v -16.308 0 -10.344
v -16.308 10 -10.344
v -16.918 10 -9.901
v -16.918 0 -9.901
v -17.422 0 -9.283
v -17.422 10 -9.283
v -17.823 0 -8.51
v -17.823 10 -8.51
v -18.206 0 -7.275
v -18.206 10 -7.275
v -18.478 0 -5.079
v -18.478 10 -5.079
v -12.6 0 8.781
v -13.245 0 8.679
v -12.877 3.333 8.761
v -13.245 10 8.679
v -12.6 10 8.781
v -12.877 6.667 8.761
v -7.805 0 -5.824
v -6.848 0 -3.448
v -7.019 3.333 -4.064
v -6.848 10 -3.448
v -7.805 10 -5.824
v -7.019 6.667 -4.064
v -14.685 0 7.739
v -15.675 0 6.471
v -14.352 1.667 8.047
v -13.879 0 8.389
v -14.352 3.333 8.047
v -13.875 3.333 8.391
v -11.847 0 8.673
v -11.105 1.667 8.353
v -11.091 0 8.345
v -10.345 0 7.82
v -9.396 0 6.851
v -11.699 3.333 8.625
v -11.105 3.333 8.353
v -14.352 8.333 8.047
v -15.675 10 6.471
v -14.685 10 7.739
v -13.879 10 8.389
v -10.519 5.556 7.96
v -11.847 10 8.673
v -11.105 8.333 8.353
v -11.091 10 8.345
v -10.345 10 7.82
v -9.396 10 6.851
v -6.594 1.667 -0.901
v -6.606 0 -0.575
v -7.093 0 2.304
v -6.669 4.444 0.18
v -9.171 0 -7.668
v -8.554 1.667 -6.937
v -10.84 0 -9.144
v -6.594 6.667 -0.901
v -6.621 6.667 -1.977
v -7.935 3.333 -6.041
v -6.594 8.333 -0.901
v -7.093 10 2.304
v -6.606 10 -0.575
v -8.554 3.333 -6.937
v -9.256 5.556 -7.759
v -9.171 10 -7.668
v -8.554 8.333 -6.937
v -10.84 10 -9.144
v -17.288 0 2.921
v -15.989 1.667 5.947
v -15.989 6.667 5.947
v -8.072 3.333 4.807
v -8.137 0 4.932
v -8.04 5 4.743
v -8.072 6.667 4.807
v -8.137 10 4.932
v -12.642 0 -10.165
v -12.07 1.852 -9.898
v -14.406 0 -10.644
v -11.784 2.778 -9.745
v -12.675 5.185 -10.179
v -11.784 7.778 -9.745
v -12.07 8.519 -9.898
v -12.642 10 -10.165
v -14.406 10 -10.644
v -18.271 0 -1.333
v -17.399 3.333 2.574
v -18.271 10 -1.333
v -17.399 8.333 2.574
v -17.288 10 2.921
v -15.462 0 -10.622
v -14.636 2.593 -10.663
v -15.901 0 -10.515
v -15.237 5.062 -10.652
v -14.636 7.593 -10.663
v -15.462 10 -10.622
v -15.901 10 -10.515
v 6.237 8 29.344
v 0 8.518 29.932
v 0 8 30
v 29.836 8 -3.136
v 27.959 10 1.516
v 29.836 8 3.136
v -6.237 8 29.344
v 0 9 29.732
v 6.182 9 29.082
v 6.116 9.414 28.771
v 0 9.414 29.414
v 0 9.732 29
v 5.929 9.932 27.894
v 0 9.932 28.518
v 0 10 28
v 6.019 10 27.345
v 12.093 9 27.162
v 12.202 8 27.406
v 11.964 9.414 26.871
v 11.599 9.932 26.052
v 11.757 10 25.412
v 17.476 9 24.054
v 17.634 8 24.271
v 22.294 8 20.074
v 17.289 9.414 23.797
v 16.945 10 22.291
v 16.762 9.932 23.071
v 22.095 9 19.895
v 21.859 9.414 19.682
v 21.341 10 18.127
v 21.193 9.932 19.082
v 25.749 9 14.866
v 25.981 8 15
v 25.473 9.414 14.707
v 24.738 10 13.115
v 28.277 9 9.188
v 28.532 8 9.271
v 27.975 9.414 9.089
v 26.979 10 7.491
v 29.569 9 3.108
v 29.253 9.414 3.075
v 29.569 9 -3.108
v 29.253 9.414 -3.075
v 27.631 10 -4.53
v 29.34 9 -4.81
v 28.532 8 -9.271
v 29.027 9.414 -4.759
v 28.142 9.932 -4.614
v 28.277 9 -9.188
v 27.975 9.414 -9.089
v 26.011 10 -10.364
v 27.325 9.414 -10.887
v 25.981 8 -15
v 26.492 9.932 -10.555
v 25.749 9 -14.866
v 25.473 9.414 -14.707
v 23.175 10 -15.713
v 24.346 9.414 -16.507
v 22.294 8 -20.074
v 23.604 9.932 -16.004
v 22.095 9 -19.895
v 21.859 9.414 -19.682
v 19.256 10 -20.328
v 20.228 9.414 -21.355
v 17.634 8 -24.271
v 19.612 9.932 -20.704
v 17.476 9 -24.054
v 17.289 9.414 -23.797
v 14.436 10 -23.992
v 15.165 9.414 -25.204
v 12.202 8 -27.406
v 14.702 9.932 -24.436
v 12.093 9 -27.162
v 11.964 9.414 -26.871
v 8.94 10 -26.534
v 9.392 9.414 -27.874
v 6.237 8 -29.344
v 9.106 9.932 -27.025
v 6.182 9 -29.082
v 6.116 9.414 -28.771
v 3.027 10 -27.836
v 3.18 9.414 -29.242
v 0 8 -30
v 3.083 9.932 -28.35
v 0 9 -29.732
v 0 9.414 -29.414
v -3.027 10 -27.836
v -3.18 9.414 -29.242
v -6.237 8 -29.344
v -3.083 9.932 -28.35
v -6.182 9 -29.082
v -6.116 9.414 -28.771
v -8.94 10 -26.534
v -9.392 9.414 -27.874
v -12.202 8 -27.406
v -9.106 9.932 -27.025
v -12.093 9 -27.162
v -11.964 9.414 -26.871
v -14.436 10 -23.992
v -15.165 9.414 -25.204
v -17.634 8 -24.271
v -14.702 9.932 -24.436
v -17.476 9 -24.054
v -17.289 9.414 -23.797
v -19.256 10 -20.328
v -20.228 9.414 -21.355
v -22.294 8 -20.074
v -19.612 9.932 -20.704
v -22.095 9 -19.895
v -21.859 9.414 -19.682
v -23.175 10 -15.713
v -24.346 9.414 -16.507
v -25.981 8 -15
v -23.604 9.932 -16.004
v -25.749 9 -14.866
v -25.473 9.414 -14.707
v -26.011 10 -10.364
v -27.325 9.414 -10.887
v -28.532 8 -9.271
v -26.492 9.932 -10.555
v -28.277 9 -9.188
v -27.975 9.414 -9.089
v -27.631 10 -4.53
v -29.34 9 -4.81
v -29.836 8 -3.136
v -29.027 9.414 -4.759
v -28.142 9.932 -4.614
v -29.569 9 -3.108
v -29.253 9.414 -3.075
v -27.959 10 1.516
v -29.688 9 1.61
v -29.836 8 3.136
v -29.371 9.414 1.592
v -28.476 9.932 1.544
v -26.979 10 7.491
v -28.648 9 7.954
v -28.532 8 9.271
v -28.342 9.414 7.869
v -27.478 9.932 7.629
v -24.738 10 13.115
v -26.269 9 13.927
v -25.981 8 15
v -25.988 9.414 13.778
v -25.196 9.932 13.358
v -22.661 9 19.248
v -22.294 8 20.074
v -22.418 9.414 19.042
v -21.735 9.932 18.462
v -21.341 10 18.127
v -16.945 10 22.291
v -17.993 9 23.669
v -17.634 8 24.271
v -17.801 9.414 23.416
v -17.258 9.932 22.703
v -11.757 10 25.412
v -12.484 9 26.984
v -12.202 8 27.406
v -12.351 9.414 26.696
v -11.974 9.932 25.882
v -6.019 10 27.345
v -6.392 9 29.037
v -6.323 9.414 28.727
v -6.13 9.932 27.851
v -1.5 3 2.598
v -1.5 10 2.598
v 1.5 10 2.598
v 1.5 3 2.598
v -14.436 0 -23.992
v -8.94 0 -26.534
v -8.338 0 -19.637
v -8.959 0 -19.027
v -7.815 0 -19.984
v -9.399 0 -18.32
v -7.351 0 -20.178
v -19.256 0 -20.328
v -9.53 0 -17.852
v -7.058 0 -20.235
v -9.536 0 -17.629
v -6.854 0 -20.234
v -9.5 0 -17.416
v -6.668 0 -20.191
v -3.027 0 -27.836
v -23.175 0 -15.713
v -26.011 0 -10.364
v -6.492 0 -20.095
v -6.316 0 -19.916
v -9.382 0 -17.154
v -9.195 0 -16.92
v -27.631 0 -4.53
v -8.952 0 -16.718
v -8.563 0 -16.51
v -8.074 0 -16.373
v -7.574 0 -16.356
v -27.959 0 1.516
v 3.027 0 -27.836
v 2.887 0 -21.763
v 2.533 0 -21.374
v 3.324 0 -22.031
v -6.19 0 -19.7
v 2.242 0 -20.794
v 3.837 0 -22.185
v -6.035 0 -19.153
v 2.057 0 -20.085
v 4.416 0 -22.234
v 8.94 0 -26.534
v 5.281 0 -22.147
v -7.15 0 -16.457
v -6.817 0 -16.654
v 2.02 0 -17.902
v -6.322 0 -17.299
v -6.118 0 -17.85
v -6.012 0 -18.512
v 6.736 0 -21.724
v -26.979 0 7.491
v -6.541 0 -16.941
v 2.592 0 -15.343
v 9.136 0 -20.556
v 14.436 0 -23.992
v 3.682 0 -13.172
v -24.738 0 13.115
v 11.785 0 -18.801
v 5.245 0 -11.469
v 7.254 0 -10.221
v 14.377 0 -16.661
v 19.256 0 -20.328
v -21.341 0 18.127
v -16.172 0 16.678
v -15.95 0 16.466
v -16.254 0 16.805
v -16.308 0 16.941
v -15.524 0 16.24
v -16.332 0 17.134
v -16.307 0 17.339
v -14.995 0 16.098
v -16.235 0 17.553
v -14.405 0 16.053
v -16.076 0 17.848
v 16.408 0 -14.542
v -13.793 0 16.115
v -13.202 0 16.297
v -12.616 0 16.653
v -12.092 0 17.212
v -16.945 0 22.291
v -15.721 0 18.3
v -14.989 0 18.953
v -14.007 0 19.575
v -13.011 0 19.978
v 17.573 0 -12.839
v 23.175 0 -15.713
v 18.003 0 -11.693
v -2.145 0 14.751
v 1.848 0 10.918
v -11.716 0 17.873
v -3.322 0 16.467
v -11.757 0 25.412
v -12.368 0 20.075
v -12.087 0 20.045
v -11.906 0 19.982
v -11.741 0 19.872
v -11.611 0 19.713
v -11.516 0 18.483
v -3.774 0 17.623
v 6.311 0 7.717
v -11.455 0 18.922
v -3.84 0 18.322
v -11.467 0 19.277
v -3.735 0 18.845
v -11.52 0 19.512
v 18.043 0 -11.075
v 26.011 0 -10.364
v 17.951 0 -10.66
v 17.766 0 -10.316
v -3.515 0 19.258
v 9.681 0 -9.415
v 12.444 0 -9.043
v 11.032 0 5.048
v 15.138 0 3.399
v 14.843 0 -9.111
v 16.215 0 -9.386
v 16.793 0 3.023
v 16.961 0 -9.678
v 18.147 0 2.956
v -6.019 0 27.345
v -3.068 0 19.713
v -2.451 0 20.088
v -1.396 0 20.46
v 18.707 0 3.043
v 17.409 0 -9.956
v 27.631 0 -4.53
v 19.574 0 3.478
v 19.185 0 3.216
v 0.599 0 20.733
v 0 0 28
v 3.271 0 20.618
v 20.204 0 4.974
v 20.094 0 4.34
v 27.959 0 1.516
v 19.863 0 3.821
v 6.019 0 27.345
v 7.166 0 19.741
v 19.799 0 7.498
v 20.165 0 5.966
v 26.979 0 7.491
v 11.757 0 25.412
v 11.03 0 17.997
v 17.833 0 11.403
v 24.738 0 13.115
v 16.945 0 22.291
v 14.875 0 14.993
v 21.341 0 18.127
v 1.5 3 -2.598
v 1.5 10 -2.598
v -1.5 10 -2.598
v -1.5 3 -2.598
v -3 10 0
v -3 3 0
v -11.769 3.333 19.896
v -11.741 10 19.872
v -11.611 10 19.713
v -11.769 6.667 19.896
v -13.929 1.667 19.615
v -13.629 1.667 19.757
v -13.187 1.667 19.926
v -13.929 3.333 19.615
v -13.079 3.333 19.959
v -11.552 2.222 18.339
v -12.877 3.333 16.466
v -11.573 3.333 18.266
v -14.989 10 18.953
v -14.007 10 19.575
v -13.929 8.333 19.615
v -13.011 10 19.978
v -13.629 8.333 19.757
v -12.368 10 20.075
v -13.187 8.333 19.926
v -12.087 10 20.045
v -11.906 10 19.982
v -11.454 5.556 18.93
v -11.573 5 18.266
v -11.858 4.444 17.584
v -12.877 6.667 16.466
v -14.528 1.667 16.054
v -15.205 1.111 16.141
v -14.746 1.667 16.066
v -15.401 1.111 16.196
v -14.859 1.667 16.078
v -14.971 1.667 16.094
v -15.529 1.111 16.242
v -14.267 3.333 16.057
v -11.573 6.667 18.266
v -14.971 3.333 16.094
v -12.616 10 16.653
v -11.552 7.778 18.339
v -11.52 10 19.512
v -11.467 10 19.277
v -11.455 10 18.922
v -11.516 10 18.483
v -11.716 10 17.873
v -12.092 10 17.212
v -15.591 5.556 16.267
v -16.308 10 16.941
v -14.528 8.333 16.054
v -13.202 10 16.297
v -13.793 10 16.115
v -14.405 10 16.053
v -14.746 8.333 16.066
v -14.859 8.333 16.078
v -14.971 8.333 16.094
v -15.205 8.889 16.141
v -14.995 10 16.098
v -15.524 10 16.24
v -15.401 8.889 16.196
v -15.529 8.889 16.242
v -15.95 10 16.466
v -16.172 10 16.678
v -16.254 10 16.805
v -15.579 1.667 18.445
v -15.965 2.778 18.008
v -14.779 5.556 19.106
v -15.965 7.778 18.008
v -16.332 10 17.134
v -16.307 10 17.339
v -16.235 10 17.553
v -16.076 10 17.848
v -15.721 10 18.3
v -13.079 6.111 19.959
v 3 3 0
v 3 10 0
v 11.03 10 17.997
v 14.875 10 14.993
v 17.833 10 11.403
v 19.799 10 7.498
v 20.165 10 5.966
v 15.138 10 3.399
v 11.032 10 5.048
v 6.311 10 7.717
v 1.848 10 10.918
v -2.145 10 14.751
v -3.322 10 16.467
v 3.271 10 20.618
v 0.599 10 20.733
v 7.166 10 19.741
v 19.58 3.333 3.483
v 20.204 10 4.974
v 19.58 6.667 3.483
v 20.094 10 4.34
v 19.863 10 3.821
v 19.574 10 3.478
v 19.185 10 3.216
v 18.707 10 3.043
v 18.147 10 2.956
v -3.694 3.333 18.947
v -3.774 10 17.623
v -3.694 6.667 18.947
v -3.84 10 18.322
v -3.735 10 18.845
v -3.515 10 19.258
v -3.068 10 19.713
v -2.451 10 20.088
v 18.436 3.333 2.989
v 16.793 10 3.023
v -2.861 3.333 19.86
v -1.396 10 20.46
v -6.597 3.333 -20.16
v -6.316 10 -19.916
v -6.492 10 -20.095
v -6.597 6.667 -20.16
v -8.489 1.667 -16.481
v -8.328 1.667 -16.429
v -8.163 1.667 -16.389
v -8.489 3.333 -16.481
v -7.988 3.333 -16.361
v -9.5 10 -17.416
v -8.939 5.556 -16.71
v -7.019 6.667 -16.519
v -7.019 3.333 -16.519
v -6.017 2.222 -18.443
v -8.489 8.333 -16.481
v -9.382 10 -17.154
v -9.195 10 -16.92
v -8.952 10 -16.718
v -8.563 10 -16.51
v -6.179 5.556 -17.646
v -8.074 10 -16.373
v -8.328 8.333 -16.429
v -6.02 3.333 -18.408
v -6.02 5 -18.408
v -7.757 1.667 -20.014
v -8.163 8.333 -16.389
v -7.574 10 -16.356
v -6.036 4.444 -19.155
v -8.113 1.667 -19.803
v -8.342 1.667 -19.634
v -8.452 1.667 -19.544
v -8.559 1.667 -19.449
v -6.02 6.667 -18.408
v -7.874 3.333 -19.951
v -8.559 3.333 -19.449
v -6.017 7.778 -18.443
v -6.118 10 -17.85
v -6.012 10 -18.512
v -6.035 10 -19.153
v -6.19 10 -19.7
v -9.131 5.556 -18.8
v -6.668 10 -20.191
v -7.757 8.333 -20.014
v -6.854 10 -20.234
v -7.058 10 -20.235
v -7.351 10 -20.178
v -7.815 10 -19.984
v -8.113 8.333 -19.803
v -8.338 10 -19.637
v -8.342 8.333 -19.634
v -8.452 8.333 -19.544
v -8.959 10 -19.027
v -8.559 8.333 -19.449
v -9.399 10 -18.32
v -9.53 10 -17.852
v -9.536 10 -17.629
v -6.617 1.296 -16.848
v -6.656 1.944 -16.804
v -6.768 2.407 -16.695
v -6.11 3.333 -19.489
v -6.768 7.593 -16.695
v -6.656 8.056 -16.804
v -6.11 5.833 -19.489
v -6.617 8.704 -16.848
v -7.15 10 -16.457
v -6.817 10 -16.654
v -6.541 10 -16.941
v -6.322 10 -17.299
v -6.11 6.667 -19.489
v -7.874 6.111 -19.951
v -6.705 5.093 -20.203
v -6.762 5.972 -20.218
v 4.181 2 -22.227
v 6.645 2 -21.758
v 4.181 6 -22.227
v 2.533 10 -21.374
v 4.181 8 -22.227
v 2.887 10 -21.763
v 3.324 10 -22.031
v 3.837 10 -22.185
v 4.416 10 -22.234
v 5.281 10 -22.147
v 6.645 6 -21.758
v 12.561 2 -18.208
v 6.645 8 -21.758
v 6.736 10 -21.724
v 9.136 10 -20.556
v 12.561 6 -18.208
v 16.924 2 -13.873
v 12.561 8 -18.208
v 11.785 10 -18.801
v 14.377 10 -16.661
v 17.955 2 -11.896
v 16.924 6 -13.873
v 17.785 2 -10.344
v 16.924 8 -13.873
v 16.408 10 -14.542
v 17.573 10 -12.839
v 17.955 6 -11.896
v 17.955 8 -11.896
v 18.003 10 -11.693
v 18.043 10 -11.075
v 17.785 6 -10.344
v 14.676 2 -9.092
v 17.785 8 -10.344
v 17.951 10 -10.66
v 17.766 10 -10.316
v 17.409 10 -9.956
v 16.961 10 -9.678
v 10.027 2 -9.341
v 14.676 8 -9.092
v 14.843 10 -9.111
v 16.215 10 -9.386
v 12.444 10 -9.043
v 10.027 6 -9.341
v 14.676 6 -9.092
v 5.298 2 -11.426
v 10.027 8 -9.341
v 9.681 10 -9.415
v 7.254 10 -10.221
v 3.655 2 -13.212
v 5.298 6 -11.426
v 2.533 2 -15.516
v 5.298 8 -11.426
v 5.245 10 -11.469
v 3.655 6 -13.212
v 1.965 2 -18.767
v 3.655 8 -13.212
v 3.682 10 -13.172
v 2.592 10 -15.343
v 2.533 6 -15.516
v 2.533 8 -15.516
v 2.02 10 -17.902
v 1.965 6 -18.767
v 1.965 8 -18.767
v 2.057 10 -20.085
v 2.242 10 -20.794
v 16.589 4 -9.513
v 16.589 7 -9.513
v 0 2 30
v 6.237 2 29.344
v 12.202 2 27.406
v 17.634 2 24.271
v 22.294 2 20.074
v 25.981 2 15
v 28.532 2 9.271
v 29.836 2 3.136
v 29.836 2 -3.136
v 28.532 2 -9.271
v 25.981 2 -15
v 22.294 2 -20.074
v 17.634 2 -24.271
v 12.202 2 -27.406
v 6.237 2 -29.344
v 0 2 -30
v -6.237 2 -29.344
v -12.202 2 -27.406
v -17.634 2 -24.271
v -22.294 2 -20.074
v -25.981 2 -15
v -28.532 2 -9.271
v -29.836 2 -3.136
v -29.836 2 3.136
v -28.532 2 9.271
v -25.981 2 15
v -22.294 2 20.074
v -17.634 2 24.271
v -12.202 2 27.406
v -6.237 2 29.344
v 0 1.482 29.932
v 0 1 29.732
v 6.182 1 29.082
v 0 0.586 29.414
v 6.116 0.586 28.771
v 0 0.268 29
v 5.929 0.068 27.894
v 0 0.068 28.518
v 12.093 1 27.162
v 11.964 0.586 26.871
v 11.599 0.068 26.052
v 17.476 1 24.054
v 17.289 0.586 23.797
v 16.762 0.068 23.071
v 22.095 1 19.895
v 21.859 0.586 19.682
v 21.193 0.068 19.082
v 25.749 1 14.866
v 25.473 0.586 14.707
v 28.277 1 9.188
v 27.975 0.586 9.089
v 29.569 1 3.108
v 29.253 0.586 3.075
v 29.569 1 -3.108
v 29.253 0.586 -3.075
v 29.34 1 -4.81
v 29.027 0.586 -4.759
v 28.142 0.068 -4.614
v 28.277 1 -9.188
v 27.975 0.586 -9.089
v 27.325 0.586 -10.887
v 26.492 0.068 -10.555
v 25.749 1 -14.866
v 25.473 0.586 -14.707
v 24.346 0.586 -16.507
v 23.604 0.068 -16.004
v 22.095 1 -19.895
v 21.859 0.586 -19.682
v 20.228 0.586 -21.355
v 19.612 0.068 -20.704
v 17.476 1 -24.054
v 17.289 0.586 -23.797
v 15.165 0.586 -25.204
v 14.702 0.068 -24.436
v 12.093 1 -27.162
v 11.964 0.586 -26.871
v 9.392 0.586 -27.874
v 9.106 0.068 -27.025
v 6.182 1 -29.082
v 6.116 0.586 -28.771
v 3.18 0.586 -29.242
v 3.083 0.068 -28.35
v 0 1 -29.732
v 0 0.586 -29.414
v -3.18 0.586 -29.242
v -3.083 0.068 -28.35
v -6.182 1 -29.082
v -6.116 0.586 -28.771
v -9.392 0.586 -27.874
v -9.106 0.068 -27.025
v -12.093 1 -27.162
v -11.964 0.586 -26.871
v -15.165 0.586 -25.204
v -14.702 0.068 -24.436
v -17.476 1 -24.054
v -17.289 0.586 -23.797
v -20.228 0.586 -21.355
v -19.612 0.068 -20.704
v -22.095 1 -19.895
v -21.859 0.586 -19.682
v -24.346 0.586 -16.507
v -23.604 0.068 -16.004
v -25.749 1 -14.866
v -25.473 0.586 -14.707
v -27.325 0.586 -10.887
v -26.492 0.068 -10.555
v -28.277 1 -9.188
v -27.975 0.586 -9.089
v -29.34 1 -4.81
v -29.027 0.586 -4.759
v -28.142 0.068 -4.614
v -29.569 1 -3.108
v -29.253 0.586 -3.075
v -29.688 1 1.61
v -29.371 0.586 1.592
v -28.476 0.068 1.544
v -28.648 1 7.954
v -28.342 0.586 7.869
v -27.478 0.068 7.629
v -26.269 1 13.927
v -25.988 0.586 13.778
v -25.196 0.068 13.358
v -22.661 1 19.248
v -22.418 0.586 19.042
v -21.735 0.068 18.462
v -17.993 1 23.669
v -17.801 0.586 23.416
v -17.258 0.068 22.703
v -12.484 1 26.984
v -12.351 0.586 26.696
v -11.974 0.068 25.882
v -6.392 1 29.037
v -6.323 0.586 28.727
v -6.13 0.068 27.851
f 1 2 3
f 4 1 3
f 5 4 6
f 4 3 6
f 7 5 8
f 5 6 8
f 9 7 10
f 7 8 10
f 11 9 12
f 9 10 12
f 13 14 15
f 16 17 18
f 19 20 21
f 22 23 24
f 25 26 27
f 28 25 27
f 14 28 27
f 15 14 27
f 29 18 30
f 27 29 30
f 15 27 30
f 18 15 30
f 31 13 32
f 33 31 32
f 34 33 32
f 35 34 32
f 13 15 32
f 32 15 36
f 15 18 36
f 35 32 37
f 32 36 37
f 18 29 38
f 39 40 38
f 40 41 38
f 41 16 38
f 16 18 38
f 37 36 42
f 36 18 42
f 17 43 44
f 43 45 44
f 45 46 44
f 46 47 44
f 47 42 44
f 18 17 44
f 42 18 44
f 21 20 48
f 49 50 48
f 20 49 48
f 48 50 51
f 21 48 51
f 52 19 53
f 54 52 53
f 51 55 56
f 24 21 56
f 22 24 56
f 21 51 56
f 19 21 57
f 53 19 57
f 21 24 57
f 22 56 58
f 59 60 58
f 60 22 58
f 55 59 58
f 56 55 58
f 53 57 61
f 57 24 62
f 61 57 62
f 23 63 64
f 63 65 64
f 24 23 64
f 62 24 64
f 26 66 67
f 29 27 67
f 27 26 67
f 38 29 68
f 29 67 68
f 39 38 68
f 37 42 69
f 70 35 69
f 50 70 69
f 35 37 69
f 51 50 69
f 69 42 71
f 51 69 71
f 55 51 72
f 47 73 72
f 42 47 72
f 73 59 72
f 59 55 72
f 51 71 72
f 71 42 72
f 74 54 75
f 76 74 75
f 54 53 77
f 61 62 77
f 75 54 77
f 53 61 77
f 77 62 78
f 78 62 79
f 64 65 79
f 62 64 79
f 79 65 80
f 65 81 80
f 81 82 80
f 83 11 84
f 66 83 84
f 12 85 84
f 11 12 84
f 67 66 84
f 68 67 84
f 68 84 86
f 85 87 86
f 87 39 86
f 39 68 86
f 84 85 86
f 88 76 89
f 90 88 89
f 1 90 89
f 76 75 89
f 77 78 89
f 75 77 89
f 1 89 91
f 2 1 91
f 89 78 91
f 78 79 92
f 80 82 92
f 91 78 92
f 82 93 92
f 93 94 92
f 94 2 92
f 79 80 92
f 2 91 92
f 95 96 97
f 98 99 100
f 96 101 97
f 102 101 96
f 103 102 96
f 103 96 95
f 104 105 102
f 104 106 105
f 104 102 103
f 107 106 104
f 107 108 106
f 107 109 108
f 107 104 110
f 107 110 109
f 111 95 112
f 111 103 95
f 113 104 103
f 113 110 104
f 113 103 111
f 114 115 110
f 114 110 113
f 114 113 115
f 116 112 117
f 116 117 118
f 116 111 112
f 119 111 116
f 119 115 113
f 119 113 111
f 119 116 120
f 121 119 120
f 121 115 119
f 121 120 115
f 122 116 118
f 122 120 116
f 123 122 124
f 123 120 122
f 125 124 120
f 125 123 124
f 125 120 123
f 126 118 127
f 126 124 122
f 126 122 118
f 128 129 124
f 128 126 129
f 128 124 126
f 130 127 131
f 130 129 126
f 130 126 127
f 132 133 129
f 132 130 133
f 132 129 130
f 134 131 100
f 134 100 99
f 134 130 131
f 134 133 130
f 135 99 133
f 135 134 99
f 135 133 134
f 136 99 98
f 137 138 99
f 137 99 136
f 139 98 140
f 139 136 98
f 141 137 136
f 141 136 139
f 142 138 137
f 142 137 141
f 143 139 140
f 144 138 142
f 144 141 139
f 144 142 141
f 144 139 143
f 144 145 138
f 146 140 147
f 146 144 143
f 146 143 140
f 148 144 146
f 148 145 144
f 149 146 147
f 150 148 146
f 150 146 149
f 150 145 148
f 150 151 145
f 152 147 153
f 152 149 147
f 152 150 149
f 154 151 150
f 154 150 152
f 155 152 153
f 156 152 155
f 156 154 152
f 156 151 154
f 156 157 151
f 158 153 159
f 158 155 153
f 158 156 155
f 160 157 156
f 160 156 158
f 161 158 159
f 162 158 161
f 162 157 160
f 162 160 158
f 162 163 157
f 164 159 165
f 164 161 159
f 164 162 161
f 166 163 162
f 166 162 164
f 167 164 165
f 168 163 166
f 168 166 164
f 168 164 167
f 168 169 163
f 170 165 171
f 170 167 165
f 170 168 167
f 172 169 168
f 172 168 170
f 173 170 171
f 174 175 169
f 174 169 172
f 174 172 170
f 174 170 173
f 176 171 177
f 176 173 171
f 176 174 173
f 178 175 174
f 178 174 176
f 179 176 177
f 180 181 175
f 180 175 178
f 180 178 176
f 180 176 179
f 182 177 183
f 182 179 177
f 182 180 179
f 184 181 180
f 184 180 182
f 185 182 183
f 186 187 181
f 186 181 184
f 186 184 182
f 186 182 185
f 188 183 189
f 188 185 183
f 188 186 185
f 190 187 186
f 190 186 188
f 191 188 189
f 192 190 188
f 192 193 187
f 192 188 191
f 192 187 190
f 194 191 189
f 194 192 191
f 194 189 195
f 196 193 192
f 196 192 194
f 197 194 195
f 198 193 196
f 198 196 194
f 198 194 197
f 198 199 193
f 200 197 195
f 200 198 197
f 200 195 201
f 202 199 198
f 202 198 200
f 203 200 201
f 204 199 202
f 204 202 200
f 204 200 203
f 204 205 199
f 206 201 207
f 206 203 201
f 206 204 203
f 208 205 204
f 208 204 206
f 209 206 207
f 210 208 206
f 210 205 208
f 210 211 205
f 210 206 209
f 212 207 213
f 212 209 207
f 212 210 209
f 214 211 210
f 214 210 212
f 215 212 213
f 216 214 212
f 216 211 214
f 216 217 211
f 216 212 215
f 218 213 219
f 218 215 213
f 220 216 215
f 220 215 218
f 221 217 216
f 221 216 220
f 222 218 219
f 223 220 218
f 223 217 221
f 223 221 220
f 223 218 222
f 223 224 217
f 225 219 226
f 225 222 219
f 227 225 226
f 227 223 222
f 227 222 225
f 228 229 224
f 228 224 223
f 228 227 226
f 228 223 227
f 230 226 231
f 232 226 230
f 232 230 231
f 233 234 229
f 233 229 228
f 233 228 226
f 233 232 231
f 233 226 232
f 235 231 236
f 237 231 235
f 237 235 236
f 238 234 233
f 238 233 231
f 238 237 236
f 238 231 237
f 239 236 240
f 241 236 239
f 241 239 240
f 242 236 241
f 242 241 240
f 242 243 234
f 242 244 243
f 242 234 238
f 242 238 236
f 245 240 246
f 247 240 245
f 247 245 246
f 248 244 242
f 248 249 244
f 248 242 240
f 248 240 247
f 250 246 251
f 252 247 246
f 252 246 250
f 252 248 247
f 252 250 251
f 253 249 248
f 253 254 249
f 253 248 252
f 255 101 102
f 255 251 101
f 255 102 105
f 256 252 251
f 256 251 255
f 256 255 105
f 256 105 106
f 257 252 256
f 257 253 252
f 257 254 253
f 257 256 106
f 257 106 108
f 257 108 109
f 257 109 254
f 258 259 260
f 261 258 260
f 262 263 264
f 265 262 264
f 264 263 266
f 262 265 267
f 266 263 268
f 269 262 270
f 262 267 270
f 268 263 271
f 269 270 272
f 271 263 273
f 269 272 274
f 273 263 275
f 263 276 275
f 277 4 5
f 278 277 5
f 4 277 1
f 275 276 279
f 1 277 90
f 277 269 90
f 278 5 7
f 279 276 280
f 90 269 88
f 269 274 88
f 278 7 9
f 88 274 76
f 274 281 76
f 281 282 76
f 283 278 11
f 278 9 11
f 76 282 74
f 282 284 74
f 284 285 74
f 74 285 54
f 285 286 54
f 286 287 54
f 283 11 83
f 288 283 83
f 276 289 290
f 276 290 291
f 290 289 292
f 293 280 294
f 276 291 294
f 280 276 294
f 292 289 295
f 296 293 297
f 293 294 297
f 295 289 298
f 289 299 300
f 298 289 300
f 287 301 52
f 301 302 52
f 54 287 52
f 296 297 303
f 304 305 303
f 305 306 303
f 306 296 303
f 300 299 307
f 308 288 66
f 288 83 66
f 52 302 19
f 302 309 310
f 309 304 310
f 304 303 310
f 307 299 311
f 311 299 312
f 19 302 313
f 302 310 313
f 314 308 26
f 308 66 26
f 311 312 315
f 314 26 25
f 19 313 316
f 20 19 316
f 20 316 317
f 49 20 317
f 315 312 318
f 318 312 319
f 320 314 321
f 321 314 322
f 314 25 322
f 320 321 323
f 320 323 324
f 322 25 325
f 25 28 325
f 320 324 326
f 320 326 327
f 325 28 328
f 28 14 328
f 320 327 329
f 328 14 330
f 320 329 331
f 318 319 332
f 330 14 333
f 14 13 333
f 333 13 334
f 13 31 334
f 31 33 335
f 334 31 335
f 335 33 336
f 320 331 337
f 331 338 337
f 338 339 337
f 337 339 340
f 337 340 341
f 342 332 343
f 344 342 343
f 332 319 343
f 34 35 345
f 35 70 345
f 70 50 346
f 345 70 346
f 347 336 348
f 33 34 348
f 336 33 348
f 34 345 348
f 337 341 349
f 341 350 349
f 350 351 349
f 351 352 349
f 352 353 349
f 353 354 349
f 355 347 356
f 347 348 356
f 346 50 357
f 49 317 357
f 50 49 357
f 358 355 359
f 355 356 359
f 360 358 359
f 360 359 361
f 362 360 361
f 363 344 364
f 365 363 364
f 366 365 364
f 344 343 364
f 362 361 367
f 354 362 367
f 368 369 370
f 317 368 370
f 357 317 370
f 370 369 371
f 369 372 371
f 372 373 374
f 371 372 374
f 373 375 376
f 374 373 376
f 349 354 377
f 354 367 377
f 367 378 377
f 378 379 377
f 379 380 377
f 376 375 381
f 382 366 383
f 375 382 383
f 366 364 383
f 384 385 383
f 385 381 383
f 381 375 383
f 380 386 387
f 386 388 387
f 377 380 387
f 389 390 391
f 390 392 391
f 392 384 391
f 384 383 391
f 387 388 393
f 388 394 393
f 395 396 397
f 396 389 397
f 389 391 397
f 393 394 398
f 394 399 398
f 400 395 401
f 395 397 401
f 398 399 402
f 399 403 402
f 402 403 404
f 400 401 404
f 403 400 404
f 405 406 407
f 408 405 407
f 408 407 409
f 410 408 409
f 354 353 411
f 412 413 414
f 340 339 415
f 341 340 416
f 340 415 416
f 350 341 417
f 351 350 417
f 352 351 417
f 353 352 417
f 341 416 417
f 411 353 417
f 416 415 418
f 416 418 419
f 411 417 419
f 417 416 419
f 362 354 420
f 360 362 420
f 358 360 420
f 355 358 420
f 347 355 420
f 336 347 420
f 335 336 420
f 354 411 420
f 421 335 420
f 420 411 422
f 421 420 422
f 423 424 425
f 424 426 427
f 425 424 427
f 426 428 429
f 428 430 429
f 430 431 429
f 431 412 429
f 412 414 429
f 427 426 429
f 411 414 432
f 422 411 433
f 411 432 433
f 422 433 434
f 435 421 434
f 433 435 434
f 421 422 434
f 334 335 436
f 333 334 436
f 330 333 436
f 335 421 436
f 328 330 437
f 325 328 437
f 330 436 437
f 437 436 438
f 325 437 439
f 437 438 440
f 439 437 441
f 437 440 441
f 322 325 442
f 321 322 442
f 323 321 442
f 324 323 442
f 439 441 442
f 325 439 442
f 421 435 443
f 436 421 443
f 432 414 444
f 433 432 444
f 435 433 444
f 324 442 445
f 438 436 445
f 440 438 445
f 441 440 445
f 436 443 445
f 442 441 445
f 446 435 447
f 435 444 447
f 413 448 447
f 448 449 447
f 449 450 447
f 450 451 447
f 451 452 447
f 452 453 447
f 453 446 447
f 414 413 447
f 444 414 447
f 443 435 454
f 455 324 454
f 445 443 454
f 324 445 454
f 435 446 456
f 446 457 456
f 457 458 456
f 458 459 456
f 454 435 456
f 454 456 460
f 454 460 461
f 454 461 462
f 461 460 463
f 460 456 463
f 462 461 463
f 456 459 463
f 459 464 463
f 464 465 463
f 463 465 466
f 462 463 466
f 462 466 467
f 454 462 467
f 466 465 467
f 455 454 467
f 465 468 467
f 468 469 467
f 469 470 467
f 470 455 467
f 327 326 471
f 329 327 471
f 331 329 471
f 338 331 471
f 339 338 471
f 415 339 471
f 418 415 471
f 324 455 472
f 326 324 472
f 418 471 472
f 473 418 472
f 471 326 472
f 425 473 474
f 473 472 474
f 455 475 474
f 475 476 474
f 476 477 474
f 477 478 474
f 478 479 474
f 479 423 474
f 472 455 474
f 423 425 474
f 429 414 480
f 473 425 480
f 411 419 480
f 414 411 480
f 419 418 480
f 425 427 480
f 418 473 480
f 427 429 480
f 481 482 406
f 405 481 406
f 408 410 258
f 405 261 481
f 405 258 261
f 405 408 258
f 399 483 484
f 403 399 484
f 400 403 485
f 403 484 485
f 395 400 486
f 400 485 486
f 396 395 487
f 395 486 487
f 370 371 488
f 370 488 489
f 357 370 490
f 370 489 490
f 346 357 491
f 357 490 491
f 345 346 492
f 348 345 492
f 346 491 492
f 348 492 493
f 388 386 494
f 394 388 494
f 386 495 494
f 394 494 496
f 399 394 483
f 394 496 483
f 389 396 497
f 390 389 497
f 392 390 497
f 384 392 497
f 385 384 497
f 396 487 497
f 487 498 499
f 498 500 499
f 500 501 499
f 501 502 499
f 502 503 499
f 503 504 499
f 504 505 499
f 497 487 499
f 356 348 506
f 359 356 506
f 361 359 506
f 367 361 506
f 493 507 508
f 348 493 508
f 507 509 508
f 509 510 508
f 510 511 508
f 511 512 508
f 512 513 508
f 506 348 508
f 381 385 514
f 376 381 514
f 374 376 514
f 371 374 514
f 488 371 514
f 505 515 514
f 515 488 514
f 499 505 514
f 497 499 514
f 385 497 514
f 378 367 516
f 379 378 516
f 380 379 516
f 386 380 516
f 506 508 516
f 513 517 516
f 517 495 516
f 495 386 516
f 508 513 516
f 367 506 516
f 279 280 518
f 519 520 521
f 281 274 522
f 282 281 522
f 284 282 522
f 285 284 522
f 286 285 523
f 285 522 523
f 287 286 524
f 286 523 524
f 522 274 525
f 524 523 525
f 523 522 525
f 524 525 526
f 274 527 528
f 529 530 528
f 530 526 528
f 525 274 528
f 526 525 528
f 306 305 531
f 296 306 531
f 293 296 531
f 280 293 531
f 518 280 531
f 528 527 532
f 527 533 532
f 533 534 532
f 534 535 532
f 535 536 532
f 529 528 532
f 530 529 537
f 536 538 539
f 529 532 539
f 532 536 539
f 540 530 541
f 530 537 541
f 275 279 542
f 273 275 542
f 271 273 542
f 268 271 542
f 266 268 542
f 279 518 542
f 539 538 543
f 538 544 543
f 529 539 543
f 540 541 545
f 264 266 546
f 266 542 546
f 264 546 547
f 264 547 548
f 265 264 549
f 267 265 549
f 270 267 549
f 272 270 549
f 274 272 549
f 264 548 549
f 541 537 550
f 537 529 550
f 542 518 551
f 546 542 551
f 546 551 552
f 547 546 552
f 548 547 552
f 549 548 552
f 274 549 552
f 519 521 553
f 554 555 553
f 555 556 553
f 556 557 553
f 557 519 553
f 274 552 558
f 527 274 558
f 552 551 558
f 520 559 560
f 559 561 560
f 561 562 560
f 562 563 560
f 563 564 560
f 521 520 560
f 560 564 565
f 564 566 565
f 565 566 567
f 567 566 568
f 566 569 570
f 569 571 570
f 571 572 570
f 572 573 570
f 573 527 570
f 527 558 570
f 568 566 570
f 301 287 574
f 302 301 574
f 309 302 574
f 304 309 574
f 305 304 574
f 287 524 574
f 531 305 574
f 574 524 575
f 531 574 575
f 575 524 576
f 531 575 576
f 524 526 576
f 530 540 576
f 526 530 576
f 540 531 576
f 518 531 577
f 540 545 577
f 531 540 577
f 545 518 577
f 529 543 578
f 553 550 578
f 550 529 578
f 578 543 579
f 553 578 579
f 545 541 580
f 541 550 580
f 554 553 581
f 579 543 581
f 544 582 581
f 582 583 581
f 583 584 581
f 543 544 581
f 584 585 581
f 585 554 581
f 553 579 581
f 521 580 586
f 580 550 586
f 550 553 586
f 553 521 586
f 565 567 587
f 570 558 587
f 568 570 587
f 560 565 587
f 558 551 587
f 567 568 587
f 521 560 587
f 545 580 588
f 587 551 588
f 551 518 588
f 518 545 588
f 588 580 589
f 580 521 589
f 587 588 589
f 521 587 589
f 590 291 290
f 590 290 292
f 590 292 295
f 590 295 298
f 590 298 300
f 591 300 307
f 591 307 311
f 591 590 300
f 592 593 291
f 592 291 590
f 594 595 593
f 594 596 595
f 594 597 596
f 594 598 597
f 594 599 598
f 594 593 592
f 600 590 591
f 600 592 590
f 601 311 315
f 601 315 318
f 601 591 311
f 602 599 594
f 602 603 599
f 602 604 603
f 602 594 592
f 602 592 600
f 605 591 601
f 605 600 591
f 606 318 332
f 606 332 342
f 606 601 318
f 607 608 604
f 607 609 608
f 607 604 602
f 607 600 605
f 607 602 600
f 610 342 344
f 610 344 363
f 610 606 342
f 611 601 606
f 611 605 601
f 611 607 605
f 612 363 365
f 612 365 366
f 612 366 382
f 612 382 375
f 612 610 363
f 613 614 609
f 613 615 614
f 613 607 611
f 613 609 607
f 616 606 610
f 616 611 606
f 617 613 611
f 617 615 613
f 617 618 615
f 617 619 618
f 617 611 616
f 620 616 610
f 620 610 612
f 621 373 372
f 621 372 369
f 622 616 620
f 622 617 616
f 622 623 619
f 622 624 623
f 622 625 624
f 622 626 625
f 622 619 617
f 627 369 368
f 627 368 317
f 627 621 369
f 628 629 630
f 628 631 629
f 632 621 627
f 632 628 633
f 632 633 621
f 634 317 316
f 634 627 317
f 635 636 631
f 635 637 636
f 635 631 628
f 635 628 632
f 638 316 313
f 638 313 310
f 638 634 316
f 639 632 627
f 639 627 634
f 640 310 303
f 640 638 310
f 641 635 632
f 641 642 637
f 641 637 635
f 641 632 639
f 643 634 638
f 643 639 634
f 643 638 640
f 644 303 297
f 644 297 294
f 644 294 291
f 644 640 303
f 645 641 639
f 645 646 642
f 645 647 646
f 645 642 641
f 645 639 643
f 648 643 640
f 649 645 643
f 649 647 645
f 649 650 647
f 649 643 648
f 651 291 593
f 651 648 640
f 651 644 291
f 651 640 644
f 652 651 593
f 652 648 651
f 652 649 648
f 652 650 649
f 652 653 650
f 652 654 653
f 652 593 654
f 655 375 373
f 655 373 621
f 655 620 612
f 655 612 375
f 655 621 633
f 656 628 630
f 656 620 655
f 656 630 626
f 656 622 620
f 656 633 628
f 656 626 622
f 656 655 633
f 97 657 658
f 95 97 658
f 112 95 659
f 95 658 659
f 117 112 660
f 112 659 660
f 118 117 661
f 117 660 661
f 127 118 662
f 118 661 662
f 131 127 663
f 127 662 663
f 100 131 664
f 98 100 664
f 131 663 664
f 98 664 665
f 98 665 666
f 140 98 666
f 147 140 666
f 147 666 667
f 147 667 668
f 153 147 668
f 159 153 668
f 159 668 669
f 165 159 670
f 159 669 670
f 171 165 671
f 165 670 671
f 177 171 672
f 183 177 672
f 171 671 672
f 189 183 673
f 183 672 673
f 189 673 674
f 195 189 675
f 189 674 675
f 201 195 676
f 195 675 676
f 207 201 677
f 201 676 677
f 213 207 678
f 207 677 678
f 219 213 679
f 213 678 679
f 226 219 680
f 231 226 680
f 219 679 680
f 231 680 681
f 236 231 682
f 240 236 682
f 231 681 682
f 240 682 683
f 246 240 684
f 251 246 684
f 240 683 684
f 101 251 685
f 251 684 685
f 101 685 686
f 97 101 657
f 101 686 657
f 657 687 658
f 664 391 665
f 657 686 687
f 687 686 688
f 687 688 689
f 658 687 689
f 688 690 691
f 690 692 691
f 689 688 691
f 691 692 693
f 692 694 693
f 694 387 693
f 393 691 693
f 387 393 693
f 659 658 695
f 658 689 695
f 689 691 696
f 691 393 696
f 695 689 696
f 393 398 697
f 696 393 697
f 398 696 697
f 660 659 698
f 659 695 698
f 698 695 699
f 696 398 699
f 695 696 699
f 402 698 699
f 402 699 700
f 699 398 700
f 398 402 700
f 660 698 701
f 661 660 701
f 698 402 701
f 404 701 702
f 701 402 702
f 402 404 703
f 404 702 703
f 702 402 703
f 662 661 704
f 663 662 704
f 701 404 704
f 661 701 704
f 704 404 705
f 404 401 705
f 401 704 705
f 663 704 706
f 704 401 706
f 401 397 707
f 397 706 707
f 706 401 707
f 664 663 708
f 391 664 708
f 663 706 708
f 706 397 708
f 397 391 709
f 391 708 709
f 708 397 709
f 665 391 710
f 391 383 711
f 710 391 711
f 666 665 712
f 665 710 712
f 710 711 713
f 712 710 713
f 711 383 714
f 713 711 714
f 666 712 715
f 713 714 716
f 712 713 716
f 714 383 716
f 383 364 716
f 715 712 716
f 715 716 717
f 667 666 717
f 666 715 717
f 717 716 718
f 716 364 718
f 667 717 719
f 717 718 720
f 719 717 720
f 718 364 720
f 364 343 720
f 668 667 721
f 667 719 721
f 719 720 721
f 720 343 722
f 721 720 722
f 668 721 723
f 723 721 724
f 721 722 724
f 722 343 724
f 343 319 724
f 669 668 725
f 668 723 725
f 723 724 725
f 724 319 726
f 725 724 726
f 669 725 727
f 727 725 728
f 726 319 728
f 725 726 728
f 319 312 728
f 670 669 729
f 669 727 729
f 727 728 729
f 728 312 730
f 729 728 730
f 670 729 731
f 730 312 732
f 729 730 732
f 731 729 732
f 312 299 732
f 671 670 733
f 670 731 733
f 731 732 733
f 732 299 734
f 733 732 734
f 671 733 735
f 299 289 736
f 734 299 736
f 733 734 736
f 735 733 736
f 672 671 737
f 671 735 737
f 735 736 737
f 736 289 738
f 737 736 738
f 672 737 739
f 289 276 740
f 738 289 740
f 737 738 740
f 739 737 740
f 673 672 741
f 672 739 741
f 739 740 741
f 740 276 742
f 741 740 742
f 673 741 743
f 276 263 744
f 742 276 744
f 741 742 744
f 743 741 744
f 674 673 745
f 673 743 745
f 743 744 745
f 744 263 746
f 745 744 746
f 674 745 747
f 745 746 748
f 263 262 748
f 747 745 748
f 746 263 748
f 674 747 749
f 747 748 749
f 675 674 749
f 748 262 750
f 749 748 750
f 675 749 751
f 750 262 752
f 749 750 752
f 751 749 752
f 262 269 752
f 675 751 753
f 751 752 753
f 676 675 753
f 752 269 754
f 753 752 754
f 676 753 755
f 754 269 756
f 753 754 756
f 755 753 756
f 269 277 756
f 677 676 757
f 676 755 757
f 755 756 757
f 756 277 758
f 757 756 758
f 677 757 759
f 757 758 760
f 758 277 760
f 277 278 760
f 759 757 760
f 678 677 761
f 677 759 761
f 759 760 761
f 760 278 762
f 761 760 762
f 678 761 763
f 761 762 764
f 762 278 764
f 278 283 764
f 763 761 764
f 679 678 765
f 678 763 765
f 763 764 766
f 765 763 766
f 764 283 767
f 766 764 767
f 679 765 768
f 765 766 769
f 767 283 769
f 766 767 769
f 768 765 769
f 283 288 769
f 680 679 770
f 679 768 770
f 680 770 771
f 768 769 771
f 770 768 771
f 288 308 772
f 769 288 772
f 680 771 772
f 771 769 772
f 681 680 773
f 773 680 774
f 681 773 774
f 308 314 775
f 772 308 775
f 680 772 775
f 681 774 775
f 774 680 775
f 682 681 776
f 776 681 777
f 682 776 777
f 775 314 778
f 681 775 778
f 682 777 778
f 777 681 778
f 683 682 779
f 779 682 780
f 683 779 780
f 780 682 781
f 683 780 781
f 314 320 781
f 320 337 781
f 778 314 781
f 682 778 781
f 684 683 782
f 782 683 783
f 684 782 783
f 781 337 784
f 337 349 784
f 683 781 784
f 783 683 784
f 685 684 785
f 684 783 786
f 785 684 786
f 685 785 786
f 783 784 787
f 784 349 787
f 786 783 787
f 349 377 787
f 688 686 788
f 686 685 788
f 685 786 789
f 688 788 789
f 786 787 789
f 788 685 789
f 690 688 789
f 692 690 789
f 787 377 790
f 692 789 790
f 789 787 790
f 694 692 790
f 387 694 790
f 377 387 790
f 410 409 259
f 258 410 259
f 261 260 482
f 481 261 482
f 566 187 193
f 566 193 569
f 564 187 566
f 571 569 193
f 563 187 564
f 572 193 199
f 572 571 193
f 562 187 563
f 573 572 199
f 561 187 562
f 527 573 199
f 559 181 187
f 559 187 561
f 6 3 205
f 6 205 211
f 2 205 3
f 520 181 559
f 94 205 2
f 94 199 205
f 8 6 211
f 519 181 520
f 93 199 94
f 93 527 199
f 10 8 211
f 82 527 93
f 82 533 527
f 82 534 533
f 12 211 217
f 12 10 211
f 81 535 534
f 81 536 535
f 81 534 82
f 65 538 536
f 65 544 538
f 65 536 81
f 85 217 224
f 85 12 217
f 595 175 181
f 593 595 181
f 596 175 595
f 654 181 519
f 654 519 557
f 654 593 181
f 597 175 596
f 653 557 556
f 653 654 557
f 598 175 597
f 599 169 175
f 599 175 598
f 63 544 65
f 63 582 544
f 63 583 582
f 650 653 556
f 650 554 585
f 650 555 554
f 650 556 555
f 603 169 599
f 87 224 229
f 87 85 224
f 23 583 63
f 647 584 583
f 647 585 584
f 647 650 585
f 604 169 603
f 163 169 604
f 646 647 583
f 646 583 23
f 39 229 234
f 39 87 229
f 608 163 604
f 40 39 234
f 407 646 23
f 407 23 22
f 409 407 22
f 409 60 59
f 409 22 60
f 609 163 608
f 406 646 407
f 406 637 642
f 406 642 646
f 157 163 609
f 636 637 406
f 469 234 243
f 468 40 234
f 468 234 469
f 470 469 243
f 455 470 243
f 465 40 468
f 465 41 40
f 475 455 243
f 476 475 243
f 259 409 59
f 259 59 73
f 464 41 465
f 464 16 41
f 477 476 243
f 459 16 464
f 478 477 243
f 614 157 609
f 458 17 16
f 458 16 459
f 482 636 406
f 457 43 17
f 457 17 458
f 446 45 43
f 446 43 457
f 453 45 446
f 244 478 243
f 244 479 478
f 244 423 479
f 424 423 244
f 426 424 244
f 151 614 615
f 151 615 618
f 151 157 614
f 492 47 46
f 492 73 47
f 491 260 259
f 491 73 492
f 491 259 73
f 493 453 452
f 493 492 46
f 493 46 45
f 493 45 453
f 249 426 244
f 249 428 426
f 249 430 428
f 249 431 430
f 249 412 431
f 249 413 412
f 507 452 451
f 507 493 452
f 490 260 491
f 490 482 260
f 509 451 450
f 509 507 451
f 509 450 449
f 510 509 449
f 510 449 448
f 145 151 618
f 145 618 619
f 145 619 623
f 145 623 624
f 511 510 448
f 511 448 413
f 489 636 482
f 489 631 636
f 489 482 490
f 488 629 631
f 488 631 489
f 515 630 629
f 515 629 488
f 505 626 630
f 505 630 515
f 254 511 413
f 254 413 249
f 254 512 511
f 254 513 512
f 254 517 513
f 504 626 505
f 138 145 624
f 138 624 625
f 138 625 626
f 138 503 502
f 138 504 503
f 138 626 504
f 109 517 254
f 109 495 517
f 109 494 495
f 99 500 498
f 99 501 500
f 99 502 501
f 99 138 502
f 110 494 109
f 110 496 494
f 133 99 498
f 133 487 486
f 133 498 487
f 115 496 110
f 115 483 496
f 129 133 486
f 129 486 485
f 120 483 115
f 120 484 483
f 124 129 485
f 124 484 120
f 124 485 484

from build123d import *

# Parameters (mm, degrees)
SKETCH1_R           = 30
BOSS_EXTRUDE1_DEPTH = 10
CUT_EXTRUDE1_DEPTH  = 7
FILLET1_R           = 2
CUT_EXTRUDE2_DEPTH  = 10


with BuildPart() as part:
    # Sketch1 → Boss-Extrude1 (new body)
    with BuildSketch(Plane(origin=(0, 0, 0), x_dir=(1, 0, 0), z_dir=(0, 1, 0))):
        with Locations(Location((0, 0, 0), (0, 0, 270))):
            Circle(SKETCH1_R)
    extrude(amount=BOSS_EXTRUDE1_DEPTH)

    # Sketch2 → Cut-Extrude1 (cut)
    with BuildSketch(Plane(origin=(0, 10, 0), x_dir=(1, 0, 0), z_dir=(0, 1, 0))):
        Polygon((1.5, -2.598076211), (3, 0), (1.5, 2.598076211), (-1.5, 2.598076211), (-3, 0), (-1.5, -2.598076211), align=None)
    extrude(amount=-CUT_EXTRUDE1_DEPTH, mode=Mode.SUBTRACT)

    # Fillet1
    fillet1_edges = [part.edges().sort_by_distance(p)[0] for p in [
        (0, 0, -30),
        (0, 10, -30),
    ]]
    fillet(fillet1_edges, radius=FILLET1_R)

    # Sketch3 → Cut-Extrude2 (cut)
    with BuildSketch(Plane(origin=(0, 10, 0), x_dir=(1, 0, 0), z_dir=(0, 1, 0))):
        with BuildLine():
            add(Edge.make_bspline(
                [(-16.307732363, 10.344063247), (-20.858304808, 7.955304571), (-15.247461525, -19.786083503), (-1.86899315, 4.533824594), (-13.679079495, 11.72393741), (-16.307732363, 10.344063247)],
                knots=[0, 0, 0, 0, 0.434023147, 0.749285128, 1, 1, 1, 1], degree=3))
        make_face()
        with BuildLine():
            add(Edge.make_bspline(
                [(11.030149074, -17.996559016), (17.698059776, -14.029116362), (28.801019424, 8.467649404), (-17.246263742, -21.551104151), (5.189314319, -21.471887043), (11.030149074, -17.996559016)],
                knots=[0, 0, 0, 0, 0.282898464, 0.752191766, 1, 1, 1, 1], degree=3))
        make_face()
        with BuildLine():
            add(Edge.make_bspline(
                [(2.533239979, 21.374212321), (4.02417516, 23.543719172), (12.830669115, 19.252417996), (21.358390269, 9.199335639), (8.376874504, 8.478204161), (2.09284829, 13.299227863), (1.70265038, 20.165595174), (2.533239979, 21.374212321)],
                knots=[0, 0, 0, 0, 0.242585442, 0.460385525, 0.640847003, 0.864857341, 1, 1, 1, 1], degree=3))
        make_face()
        with BuildLine():
            add(Edge.make_bspline(
                [(-9.49964992, 17.416024854), (-9.259580028, 16.581152381), (-5.943848627, 15.329968774), (-5.514059513, 22.474247598), (-9.863213937, 18.680363277), (-9.49964992, 17.416024854)],
                knots=[0, 0, 0, 0, 0.256133798, 0.61210866, 1, 1, 1, 1], degree=3))
        make_face()
        with BuildLine():
            add(Edge.make_bspline(
                [(-16.307732363, -16.941042358), (-16.673577152, -18.279118788), (-10.275872625, -22.410169383), (-12.085929557, -15.292292342), (-16.073806381, -16.085458646), (-16.307732363, -16.941042358)],
                knots=[0, 0, 0, 0, 0.433835951, 0.722599573, 1, 1, 1, 1], degree=3))
        make_face()
    extrude(amount=-CUT_EXTRUDE2_DEPTH, mode=Mode.SUBTRACT)


solid = part.part
